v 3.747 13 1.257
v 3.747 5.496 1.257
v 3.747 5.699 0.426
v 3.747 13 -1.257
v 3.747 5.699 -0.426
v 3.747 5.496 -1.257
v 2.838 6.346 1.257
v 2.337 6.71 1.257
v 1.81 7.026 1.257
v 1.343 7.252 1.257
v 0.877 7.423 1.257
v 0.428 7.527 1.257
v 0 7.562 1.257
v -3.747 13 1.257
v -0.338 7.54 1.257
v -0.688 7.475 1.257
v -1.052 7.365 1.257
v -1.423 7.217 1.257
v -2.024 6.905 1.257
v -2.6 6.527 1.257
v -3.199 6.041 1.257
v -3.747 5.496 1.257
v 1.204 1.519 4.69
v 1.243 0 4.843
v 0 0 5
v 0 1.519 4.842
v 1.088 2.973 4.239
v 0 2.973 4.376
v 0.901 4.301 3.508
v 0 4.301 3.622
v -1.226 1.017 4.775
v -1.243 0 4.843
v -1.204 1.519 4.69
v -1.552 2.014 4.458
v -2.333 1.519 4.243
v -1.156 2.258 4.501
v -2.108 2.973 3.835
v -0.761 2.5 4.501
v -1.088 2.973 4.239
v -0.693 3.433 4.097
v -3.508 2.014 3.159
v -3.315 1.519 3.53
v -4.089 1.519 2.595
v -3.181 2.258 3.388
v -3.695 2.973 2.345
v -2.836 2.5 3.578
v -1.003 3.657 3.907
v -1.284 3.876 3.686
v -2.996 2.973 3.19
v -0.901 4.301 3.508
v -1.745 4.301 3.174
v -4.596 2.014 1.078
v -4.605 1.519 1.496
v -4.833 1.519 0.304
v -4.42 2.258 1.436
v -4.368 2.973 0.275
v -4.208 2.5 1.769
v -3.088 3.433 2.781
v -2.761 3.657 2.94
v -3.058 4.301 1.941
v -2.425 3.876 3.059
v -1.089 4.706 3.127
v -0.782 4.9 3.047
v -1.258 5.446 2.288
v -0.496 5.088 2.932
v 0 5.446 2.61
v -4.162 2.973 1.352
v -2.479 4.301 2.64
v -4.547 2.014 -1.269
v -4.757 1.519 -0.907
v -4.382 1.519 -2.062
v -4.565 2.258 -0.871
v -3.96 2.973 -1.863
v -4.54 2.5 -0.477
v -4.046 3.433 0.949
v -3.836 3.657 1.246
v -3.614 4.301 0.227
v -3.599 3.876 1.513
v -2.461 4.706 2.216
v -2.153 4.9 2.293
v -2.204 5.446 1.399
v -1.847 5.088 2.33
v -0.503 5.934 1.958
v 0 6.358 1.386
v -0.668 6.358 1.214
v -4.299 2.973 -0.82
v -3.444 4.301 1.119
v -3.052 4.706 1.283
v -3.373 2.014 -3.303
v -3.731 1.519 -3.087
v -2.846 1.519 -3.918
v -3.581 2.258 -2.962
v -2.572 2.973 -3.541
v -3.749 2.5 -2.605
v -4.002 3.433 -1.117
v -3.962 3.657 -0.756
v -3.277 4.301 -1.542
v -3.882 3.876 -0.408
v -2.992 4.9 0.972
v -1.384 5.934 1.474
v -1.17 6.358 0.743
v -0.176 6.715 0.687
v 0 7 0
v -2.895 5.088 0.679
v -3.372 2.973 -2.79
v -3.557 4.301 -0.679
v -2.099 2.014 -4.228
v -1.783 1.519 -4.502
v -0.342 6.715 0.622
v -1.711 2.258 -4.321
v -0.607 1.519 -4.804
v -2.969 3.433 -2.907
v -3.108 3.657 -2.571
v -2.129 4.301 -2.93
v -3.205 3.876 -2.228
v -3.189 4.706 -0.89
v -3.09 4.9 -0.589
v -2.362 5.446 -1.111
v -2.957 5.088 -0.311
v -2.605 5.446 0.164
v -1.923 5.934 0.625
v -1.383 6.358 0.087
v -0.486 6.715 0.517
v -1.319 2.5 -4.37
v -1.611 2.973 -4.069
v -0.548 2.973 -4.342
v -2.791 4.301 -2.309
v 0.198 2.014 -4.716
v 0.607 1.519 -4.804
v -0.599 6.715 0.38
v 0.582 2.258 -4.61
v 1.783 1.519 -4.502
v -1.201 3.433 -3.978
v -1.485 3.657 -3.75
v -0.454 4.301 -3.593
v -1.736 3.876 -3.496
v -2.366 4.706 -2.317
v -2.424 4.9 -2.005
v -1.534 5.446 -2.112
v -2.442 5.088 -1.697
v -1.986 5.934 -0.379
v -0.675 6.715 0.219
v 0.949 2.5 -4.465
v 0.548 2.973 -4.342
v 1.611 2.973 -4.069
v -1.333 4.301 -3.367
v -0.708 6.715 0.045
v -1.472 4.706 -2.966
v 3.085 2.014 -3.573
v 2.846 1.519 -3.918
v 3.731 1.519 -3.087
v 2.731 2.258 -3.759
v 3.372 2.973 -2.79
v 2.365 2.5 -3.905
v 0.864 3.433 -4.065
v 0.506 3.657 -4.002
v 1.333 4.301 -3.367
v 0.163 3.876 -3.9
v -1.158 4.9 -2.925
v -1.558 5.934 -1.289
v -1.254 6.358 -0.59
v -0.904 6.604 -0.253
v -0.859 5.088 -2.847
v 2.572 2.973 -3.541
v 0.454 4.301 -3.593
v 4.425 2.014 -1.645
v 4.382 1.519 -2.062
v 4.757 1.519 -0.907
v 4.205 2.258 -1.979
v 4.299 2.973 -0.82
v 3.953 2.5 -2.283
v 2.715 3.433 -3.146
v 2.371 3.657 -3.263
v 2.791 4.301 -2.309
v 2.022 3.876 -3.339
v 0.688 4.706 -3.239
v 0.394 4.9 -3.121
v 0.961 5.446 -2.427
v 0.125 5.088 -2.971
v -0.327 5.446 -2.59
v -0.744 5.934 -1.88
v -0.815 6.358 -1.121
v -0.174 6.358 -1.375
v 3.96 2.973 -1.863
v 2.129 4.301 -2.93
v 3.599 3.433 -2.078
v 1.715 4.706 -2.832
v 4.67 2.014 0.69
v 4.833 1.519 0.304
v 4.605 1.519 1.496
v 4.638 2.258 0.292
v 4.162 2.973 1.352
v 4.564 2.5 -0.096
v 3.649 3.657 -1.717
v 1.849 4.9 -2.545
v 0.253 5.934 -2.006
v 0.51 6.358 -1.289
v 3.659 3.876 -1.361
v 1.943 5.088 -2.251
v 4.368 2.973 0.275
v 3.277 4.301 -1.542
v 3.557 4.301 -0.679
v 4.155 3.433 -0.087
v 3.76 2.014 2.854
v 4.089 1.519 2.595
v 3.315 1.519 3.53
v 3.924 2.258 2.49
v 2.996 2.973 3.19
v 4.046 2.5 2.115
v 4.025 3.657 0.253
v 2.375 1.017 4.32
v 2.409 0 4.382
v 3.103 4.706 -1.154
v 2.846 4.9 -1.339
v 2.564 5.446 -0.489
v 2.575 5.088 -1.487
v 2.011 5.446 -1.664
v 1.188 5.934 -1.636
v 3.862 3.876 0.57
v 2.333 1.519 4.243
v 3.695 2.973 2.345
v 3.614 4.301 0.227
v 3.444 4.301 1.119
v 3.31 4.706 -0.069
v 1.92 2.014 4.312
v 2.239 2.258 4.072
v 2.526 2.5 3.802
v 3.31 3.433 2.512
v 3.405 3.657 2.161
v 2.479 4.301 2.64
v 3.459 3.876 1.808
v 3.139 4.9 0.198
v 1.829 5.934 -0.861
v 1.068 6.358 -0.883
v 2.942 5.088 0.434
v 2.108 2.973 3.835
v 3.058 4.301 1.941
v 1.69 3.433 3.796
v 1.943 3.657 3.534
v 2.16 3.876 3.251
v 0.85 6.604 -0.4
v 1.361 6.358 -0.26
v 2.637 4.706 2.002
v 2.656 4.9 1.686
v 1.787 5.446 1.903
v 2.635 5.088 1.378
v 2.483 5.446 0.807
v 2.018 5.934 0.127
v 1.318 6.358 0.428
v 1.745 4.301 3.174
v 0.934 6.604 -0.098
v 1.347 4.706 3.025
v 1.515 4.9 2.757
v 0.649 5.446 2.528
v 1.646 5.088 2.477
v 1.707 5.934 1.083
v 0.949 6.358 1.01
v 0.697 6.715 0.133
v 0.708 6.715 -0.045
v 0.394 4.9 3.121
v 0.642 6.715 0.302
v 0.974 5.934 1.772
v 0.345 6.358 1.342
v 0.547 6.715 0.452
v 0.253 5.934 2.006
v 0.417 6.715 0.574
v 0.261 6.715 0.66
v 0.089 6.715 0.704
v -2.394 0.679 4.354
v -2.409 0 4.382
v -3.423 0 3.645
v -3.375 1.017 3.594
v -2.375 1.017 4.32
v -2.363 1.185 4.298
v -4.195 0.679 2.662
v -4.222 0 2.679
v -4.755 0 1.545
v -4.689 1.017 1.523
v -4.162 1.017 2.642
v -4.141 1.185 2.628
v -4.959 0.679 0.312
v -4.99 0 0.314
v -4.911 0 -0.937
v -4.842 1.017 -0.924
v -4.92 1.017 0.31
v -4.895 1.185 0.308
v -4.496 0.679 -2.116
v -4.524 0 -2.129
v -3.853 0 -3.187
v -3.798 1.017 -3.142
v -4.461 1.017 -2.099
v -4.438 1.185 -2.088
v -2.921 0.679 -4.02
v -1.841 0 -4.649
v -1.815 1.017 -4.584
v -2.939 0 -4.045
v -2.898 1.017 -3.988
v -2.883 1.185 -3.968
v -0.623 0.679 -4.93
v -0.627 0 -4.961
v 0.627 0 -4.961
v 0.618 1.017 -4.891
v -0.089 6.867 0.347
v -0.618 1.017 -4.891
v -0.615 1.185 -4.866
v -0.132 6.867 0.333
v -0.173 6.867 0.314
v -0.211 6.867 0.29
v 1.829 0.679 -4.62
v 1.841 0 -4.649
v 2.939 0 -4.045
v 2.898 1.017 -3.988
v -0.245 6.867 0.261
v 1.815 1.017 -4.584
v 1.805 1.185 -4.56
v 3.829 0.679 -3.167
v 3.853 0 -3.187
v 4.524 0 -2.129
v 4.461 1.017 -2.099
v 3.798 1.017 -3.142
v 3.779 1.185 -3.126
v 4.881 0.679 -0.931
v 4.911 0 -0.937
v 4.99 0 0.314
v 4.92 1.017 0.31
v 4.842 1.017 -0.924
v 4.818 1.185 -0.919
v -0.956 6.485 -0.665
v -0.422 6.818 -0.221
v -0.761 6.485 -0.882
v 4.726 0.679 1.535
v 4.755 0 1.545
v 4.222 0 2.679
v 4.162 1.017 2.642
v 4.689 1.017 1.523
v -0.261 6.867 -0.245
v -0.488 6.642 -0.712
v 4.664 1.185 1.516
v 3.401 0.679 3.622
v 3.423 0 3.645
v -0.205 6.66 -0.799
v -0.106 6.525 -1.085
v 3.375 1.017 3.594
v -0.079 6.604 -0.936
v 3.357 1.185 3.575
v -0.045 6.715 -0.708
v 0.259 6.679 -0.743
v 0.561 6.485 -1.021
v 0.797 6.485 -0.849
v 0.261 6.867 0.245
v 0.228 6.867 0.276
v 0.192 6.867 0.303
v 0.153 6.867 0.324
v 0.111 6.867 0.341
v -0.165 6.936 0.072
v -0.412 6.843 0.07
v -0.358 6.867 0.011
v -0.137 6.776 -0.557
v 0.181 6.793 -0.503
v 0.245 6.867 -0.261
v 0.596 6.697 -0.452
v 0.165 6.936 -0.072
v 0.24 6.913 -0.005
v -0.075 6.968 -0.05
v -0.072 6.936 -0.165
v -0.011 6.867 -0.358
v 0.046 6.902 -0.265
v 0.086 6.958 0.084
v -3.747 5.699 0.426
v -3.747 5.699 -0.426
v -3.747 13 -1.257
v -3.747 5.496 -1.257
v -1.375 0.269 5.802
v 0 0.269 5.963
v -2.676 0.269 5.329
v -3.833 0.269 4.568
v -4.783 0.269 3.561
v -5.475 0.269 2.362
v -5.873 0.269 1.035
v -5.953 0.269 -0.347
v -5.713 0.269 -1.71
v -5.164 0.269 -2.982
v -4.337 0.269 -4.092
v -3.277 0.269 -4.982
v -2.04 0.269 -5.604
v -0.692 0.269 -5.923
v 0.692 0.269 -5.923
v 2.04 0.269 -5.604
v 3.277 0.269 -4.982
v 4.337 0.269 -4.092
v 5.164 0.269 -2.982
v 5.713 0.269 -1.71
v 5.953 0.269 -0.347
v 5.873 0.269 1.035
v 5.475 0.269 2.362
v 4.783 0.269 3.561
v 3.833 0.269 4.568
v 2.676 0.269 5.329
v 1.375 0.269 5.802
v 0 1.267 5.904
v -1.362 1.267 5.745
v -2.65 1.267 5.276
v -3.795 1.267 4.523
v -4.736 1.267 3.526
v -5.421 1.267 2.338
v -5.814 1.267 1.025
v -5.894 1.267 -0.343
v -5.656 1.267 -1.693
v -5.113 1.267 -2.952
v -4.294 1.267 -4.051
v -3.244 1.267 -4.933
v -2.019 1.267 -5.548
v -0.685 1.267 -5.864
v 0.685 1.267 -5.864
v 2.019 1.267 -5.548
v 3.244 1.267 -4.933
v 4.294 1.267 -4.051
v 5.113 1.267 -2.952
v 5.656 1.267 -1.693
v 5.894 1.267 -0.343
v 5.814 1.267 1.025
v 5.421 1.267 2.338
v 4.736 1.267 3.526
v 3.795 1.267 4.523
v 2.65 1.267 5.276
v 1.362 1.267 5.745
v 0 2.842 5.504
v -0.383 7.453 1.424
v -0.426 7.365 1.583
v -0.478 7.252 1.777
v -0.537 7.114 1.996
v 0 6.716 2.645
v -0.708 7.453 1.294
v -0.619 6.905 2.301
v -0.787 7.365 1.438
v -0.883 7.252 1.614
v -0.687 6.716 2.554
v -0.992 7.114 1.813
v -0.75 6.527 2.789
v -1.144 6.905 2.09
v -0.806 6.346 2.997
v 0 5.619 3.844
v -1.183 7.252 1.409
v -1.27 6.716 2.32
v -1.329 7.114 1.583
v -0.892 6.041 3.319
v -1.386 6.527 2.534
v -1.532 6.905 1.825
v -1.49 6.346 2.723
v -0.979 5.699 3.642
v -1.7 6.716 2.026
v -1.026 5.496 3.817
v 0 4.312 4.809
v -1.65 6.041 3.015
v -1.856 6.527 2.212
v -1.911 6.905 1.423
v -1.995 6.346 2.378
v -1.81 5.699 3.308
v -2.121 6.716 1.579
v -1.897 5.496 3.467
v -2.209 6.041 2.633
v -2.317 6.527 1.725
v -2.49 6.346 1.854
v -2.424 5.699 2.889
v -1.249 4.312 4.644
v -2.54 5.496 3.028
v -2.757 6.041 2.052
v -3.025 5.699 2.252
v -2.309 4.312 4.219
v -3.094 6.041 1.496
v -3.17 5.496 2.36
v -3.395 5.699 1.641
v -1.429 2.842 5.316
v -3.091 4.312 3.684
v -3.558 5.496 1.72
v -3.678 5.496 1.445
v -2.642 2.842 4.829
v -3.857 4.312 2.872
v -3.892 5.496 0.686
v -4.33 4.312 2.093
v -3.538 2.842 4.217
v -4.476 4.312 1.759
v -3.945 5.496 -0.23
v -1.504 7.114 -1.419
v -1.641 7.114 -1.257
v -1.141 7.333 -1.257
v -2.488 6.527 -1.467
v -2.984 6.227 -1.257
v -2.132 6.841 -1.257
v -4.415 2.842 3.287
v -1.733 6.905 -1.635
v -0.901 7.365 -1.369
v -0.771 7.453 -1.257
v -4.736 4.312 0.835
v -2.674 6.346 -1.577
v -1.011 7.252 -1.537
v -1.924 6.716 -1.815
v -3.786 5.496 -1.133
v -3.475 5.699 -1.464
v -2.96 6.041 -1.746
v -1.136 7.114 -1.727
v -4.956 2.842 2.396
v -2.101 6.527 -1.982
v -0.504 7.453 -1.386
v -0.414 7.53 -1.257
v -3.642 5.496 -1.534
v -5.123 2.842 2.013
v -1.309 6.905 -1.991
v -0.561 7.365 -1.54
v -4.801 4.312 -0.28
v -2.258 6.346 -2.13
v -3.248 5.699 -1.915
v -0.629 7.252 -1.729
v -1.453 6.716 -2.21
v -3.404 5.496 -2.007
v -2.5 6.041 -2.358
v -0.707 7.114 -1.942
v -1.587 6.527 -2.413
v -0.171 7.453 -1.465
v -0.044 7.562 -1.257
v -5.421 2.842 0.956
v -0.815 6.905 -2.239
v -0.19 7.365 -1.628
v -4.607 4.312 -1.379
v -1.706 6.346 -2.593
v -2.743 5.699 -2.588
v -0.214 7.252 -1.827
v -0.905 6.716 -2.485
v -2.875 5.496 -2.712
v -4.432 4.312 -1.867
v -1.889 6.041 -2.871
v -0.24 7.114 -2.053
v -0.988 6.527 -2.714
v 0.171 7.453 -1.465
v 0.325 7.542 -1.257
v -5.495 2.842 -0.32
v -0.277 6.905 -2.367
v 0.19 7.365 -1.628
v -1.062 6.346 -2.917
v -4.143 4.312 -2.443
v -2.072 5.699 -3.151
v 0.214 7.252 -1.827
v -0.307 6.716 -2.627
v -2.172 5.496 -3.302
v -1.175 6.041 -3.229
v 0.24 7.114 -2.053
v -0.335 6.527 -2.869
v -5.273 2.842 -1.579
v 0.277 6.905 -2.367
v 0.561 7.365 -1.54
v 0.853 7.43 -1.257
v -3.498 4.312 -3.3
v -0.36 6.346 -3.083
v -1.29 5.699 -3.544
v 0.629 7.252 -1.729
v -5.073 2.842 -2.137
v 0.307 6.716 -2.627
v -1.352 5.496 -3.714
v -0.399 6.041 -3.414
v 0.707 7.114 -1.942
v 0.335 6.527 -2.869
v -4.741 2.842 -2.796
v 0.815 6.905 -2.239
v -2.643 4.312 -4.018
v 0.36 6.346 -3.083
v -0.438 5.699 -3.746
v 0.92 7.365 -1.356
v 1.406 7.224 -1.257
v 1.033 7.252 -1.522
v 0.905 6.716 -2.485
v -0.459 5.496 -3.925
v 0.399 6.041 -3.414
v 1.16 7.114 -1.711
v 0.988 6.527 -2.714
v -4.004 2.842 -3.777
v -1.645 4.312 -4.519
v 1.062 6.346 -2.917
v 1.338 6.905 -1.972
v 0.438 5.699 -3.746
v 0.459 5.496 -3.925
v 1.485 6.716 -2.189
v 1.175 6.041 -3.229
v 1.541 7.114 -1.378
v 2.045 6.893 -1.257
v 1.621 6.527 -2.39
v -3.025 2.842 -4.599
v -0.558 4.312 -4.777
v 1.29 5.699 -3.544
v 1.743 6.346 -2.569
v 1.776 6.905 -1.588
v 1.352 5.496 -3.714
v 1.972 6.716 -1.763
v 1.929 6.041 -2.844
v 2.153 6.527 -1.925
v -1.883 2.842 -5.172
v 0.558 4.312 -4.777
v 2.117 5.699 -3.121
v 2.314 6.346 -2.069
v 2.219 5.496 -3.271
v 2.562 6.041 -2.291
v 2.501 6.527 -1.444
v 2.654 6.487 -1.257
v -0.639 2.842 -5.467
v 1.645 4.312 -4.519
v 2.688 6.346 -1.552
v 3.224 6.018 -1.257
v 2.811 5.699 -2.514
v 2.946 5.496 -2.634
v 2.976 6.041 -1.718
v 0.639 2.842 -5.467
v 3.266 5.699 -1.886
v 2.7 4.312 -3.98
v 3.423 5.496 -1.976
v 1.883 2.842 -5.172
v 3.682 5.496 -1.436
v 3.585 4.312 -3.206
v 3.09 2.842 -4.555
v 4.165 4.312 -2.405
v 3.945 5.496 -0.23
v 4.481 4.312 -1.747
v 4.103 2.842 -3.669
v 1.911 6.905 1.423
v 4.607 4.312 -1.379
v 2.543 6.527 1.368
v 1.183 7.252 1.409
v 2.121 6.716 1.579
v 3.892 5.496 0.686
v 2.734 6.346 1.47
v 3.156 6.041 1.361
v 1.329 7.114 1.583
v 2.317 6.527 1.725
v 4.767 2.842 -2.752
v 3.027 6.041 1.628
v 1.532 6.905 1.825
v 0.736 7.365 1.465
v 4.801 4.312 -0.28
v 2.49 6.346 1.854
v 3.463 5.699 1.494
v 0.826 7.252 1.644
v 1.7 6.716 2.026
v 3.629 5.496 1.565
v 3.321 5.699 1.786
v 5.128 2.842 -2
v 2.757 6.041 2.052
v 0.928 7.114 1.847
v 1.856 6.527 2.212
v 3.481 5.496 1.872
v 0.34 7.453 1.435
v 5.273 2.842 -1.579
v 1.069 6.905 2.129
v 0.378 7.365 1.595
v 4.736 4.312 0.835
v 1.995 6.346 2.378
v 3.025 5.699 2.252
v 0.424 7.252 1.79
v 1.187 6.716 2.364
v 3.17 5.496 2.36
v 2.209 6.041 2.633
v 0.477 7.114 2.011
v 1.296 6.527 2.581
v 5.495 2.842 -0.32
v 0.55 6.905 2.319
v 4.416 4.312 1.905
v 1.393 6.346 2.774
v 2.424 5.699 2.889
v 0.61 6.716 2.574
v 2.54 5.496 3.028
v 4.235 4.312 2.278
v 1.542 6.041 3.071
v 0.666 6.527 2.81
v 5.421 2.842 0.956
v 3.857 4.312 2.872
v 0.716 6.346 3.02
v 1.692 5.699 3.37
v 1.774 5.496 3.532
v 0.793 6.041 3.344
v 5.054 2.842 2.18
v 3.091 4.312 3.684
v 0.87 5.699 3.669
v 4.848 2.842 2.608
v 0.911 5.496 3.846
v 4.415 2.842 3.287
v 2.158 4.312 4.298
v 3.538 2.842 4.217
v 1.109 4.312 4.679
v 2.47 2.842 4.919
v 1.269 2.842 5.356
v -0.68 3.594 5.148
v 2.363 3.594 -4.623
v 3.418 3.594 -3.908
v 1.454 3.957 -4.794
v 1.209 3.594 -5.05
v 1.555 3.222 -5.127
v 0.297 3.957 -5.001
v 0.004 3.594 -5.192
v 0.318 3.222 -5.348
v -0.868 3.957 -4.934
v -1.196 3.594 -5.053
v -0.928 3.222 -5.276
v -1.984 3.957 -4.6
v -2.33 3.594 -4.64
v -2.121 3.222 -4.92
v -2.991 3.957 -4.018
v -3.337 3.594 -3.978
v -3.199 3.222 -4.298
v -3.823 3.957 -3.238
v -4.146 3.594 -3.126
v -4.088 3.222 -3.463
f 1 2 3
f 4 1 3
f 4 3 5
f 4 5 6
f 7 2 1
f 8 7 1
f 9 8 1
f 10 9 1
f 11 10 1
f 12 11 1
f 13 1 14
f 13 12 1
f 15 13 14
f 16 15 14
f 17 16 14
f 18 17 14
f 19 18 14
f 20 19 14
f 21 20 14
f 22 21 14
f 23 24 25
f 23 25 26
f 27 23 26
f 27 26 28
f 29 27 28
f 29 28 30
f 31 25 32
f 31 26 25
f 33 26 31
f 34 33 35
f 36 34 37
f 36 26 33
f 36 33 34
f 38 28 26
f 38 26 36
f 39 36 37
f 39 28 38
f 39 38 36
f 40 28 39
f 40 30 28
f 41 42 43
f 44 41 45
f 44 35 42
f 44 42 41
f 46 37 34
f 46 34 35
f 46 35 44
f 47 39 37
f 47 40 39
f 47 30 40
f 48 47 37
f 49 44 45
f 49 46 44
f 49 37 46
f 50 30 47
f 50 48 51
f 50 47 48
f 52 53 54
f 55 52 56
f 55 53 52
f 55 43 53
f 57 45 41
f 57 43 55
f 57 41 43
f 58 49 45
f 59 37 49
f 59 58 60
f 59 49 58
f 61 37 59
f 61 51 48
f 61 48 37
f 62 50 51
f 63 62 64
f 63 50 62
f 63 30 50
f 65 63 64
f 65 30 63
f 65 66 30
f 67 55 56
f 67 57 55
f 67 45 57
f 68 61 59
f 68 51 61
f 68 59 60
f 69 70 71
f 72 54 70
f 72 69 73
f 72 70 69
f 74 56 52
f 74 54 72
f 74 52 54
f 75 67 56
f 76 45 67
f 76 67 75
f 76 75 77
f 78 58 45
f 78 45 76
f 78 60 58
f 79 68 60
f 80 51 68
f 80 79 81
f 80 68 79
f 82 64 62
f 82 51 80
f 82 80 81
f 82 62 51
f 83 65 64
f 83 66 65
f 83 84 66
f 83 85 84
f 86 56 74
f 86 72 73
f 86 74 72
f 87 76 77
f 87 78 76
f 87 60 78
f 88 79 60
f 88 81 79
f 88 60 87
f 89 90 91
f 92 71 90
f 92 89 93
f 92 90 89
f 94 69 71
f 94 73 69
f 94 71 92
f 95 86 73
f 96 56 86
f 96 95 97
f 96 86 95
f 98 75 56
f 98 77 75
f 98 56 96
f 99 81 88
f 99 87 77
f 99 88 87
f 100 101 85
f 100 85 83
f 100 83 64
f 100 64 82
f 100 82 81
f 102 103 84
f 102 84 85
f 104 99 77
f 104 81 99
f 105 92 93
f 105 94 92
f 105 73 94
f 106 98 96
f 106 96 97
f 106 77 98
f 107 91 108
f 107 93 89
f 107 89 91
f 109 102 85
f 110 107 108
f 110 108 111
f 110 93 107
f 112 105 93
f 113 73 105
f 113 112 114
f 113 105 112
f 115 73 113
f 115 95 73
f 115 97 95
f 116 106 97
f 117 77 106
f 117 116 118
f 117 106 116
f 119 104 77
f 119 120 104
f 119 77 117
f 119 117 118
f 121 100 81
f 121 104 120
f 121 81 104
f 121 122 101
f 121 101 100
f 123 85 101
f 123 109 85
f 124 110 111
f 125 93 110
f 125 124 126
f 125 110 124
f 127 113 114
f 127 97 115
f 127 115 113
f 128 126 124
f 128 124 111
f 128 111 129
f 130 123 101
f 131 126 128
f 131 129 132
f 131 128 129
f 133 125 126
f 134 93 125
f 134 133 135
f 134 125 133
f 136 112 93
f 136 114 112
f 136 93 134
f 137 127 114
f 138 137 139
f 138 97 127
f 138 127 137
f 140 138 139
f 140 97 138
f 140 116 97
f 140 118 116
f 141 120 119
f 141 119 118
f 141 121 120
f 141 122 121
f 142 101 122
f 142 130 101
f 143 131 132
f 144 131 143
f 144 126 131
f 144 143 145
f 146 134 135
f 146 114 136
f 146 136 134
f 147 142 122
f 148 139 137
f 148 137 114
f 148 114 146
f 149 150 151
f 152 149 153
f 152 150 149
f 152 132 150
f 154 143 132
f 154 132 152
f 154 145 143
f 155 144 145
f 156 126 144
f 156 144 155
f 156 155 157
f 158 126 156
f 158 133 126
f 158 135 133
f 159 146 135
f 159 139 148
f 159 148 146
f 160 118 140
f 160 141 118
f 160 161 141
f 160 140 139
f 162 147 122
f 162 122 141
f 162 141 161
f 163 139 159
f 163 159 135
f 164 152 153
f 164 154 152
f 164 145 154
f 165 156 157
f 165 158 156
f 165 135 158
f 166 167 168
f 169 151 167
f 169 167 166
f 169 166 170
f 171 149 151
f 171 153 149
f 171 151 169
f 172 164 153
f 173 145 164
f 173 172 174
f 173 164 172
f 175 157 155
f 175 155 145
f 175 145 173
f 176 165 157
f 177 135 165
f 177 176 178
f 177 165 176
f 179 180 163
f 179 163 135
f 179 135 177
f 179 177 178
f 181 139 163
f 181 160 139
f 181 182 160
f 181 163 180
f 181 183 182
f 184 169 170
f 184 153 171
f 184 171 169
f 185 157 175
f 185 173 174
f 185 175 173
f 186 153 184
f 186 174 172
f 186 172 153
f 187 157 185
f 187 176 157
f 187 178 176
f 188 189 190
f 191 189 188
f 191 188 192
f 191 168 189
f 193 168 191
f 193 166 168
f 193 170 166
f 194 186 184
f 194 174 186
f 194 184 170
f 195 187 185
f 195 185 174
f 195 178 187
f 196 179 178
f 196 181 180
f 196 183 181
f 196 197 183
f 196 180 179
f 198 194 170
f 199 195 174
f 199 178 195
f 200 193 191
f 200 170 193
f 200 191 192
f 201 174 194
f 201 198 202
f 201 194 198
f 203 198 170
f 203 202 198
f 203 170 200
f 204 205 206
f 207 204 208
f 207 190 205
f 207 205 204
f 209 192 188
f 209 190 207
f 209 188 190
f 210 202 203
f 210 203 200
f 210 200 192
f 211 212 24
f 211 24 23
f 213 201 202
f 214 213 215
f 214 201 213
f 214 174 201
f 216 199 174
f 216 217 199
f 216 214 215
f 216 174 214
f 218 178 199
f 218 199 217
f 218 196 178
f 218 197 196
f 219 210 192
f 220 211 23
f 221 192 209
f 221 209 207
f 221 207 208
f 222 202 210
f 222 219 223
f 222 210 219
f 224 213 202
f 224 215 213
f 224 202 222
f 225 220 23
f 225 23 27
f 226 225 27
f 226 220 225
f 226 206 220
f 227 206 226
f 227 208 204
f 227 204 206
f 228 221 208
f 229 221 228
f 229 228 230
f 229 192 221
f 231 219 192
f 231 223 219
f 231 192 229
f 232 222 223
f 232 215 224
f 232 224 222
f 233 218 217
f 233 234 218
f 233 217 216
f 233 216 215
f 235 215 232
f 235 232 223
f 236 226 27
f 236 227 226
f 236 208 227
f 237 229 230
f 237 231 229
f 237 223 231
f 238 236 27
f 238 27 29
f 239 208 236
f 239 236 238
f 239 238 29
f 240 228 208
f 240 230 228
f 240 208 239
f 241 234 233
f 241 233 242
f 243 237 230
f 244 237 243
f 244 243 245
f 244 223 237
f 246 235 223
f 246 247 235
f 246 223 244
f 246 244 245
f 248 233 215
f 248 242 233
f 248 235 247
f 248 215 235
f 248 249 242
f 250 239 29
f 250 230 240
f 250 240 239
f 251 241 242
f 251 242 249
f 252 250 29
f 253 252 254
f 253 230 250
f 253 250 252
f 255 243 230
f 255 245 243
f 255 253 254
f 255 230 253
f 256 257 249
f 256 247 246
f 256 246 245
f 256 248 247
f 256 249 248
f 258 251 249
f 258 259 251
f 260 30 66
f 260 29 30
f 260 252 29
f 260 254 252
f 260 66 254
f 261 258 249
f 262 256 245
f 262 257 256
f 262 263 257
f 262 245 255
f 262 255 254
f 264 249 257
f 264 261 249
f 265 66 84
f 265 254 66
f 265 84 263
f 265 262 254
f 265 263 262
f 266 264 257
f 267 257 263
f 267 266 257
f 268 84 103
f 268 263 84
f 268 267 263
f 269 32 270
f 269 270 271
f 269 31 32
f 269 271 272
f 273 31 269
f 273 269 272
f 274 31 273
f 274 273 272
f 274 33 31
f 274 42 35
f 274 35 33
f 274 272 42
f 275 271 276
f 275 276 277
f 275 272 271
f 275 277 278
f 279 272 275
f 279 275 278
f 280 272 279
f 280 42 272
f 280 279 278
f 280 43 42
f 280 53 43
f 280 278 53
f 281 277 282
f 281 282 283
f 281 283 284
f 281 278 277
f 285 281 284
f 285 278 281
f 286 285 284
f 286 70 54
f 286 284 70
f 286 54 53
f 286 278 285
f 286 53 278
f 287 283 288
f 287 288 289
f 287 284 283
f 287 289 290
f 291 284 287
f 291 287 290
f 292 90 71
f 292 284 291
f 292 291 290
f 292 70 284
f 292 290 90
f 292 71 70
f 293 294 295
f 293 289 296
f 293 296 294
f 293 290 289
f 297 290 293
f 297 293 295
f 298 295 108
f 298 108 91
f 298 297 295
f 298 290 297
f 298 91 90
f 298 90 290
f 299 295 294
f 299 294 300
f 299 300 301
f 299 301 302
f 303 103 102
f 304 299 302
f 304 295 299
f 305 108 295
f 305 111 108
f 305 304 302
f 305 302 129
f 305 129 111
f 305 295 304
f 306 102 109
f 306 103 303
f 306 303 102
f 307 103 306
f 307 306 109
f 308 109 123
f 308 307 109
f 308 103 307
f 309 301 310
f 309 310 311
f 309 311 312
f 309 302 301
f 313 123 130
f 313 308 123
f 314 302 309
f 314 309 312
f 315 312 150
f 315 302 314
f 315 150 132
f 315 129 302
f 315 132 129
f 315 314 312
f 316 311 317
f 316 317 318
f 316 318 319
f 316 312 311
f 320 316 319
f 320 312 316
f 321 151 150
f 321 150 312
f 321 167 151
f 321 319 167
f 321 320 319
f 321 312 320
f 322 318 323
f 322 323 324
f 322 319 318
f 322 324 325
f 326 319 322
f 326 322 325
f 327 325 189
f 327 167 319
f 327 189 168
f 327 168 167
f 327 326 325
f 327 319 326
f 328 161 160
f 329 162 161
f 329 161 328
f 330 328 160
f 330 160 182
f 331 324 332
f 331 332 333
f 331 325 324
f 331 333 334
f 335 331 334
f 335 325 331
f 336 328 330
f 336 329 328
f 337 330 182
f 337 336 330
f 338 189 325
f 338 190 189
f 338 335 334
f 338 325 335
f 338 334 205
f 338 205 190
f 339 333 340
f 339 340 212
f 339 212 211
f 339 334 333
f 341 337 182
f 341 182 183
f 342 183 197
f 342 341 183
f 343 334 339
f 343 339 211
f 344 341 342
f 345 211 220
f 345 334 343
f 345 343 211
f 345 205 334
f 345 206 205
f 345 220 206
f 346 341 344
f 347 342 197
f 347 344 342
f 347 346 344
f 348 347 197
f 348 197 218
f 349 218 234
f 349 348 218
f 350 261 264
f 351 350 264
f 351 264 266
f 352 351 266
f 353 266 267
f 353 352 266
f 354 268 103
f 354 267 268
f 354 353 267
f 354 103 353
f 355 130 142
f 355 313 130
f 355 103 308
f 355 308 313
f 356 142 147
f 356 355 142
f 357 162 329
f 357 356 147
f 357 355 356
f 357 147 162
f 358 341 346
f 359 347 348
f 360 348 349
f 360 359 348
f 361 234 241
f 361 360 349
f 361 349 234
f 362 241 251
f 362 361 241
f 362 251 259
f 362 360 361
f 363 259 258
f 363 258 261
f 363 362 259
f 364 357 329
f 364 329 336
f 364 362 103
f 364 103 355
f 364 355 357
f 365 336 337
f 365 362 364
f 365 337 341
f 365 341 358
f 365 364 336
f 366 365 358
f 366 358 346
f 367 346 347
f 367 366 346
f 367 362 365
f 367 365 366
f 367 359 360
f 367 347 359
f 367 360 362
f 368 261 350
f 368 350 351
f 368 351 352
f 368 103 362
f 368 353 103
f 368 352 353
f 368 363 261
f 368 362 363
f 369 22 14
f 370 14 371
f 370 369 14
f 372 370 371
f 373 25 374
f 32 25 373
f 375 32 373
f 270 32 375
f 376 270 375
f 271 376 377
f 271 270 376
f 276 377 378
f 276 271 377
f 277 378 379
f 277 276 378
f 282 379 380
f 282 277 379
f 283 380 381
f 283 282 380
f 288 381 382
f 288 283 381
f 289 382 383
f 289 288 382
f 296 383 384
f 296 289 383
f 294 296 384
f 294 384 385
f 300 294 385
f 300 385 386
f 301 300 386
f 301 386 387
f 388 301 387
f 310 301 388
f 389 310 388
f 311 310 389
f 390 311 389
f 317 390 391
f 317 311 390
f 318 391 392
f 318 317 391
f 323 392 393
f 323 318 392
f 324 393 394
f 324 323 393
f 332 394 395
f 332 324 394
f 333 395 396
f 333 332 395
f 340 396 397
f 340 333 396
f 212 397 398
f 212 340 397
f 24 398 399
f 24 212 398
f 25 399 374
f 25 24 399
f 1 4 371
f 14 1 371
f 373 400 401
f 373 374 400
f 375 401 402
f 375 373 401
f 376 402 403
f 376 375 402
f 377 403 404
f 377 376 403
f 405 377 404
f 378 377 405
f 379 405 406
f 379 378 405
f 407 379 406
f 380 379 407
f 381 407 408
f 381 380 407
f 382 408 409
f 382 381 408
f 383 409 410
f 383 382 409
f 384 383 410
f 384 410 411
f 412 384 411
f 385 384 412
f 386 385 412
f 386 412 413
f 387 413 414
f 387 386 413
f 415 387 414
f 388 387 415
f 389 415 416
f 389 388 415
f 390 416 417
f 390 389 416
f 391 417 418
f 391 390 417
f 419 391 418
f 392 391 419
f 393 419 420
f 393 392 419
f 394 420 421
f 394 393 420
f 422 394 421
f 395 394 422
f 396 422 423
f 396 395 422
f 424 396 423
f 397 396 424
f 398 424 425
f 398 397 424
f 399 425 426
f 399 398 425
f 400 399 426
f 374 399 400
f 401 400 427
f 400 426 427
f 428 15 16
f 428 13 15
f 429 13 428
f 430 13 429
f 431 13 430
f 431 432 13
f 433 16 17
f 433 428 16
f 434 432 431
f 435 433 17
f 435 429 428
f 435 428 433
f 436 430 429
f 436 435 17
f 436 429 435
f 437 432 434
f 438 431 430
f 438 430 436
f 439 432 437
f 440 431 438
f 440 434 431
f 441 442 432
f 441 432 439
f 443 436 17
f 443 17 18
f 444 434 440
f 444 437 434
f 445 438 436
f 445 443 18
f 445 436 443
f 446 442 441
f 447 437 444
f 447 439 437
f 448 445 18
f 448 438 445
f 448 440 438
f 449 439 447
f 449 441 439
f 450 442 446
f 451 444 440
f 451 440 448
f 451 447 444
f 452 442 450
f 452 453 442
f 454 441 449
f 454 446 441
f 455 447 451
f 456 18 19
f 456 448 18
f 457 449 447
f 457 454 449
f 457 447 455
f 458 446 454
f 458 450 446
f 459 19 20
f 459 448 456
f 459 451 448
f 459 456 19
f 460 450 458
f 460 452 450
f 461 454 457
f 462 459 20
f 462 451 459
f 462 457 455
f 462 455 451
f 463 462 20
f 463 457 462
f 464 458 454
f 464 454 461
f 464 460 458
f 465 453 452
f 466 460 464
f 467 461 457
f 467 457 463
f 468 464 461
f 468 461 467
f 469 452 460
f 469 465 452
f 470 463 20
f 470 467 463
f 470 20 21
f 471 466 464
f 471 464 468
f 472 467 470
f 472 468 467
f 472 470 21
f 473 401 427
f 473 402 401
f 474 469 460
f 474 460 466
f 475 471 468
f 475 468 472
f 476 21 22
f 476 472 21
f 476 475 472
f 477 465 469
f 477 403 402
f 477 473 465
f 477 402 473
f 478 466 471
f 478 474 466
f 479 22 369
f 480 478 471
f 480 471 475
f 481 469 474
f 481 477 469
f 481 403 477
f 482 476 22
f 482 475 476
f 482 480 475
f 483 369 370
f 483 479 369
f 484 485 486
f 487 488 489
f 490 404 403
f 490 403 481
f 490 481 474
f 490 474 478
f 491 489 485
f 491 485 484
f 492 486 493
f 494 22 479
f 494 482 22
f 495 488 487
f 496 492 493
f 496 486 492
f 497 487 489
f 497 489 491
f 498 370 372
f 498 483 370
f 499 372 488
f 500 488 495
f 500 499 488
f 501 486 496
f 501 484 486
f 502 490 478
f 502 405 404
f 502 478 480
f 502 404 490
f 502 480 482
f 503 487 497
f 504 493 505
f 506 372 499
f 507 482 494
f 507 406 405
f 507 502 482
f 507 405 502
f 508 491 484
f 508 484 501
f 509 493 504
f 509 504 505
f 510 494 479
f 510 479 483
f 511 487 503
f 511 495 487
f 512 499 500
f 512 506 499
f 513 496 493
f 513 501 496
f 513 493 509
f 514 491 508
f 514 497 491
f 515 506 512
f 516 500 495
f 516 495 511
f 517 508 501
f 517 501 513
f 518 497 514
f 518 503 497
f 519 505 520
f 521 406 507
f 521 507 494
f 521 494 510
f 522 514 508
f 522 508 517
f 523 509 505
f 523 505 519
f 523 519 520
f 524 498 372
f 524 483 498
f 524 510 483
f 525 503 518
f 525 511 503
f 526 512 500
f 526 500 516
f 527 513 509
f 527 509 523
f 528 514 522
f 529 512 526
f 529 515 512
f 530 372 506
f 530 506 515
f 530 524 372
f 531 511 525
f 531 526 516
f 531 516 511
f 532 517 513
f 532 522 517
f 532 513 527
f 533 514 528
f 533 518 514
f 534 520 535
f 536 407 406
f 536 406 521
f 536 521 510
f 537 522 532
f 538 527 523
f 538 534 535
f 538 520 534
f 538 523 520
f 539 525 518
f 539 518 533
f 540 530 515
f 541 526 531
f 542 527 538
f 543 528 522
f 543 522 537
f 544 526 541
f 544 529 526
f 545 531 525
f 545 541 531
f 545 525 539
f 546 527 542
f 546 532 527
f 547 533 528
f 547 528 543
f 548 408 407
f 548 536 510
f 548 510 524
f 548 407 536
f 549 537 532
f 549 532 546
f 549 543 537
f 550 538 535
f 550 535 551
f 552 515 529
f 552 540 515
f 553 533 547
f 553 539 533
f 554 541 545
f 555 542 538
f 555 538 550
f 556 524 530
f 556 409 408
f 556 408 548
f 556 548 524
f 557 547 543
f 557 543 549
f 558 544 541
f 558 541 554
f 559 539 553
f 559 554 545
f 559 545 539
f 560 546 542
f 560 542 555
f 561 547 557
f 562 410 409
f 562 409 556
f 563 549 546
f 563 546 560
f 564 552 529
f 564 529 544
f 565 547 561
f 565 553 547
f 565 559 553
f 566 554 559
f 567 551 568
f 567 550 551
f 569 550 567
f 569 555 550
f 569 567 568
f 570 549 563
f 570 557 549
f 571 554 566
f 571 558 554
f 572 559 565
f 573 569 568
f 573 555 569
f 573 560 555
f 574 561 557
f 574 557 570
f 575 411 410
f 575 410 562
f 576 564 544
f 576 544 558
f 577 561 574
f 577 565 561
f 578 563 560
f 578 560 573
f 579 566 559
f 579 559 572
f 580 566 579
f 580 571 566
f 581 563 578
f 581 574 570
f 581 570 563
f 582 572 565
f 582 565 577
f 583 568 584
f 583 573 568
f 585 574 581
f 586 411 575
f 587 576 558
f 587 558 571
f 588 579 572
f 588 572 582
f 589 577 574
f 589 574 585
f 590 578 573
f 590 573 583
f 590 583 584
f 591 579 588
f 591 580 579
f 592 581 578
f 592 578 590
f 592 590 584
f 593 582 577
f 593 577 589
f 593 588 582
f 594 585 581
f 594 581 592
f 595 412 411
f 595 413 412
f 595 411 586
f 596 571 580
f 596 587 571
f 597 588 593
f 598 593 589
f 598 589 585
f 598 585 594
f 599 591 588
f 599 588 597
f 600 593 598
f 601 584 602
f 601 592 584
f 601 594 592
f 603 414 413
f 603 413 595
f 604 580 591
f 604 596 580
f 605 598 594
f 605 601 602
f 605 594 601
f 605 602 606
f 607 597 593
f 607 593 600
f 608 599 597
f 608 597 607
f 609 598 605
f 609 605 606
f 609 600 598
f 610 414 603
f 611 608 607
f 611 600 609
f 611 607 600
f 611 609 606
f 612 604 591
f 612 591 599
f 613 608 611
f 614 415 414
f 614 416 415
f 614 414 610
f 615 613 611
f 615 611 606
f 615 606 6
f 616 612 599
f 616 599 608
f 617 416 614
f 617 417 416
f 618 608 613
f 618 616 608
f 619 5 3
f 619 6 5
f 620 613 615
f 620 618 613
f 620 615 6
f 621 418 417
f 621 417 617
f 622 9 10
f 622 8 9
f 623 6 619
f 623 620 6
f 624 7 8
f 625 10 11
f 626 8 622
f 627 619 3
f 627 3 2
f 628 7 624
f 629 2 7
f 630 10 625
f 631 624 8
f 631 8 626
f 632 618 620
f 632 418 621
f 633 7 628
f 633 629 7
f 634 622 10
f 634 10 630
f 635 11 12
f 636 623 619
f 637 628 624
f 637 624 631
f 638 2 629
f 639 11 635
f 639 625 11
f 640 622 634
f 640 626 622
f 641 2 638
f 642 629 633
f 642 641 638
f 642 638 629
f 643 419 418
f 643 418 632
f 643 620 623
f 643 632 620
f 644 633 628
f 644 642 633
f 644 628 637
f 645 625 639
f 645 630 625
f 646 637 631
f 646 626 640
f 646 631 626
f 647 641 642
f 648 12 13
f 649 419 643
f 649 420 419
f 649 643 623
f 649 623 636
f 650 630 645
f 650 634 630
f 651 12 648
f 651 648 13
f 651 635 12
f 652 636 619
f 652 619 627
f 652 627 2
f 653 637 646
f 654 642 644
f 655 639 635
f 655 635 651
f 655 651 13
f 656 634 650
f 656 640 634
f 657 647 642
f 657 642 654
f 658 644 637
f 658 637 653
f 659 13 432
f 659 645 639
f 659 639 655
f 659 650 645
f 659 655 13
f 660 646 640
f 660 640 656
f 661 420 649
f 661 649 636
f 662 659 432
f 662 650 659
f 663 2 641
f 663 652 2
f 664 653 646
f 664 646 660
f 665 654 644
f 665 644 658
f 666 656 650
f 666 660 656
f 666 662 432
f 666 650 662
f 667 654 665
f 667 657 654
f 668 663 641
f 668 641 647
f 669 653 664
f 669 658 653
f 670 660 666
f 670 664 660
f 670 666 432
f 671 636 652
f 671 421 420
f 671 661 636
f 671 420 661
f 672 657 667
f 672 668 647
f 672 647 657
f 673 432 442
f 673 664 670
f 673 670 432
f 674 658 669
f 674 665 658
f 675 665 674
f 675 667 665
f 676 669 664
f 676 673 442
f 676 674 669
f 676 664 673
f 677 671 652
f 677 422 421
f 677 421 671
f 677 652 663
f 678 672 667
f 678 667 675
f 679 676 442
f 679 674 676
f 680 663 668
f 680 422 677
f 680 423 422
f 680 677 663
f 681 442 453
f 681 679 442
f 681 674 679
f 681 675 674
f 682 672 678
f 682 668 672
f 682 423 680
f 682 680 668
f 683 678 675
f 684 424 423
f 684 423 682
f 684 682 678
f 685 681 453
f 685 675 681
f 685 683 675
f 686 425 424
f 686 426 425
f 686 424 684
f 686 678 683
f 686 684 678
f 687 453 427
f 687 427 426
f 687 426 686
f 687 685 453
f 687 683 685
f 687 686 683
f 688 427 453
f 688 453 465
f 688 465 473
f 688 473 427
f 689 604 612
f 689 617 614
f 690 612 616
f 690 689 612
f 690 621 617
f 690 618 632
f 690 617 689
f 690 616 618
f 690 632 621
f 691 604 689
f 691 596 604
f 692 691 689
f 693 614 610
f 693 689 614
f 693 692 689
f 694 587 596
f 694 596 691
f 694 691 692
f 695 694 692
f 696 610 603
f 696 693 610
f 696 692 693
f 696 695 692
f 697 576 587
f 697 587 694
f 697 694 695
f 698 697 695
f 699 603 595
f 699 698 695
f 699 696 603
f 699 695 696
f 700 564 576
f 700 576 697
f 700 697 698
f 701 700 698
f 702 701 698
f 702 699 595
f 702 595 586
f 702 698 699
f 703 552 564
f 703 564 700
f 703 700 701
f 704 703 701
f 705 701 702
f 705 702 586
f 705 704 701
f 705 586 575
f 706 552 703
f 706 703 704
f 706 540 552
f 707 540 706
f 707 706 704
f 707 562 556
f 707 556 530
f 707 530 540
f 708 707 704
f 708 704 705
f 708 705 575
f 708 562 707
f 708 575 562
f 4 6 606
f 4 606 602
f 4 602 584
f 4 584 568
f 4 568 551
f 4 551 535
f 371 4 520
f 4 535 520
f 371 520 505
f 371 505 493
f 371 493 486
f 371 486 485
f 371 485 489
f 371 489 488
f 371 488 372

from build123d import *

# Parameters (mm, degrees)
BOSS_EXTRU_2_REACH             = 10
ESQUISSE3_W                    = 7.493865796
ESQUISSE3_H                    = 2.51391664
BOSS_EXTRU_2_DIRECTION_2_DEPTH = 5


with BuildPart() as part:
    # Esquisse1 → R_volution2 (revolve)
    with BuildSketch(Plane(origin=(0, 0, 0), x_dir=(0, 0, -1), z_dir=(1, 0, 0)), mode=Mode.PRIVATE) as r_volution2_sk:
        with BuildLine():
            Line((0, 7), (0, 8))
            Line((0, 8), (1, 7.681145748))
            ThreePointArc((1, 7.681145748), (4.273107431, 5.101924854), (5.903887779, 1.267062649))
            Line((5.903887779, 1.267062649), (5.963189718, 0.268822557))
            Line((5.963189718, 0.268822557), (5, 0))
            ThreePointArc((5, 0), (3.621627687, 4.301162634), (0, 7))
        make_face()
    revolve(r_volution2_sk.sketch.rotate(Axis((0, 19.327032319, 0), (0, -1, 0)), 180), axis=Axis((0, 19.327032319, 0), (0, -1, 0)))  # turned: the seam where the file's is

    # Esquisse3 → Boss.-Extru.2 (add, up to next)
    with BuildSketch(Plane(origin=(0, 8, 0), x_dir=(-1, 0, 0), z_dir=(0, -1, 0)), mode=Mode.PRIVATE) as boss_extru_2_sk1:
        Rectangle(ESQUISSE3_W, ESQUISSE3_H)
    boss_extru_2_tool1 = extrude(boss_extru_2_sk1.sketch, amount=BOSS_EXTRU_2_REACH, mode=Mode.PRIVATE) - part.part
    add(boss_extru_2_tool1.solids().sort_by_distance((0, 8, 0))[0])

    # Esquisse3 → Boss.-Extru.2 direction 2 (add)
    with BuildSketch(Plane(origin=(0, 8, 0), x_dir=(-1, 0, 0), z_dir=(0, -1, 0))):
        Rectangle(ESQUISSE3_W, ESQUISSE3_H)
    extrude(amount=-BOSS_EXTRU_2_DIRECTION_2_DEPTH)


solid = part.part
